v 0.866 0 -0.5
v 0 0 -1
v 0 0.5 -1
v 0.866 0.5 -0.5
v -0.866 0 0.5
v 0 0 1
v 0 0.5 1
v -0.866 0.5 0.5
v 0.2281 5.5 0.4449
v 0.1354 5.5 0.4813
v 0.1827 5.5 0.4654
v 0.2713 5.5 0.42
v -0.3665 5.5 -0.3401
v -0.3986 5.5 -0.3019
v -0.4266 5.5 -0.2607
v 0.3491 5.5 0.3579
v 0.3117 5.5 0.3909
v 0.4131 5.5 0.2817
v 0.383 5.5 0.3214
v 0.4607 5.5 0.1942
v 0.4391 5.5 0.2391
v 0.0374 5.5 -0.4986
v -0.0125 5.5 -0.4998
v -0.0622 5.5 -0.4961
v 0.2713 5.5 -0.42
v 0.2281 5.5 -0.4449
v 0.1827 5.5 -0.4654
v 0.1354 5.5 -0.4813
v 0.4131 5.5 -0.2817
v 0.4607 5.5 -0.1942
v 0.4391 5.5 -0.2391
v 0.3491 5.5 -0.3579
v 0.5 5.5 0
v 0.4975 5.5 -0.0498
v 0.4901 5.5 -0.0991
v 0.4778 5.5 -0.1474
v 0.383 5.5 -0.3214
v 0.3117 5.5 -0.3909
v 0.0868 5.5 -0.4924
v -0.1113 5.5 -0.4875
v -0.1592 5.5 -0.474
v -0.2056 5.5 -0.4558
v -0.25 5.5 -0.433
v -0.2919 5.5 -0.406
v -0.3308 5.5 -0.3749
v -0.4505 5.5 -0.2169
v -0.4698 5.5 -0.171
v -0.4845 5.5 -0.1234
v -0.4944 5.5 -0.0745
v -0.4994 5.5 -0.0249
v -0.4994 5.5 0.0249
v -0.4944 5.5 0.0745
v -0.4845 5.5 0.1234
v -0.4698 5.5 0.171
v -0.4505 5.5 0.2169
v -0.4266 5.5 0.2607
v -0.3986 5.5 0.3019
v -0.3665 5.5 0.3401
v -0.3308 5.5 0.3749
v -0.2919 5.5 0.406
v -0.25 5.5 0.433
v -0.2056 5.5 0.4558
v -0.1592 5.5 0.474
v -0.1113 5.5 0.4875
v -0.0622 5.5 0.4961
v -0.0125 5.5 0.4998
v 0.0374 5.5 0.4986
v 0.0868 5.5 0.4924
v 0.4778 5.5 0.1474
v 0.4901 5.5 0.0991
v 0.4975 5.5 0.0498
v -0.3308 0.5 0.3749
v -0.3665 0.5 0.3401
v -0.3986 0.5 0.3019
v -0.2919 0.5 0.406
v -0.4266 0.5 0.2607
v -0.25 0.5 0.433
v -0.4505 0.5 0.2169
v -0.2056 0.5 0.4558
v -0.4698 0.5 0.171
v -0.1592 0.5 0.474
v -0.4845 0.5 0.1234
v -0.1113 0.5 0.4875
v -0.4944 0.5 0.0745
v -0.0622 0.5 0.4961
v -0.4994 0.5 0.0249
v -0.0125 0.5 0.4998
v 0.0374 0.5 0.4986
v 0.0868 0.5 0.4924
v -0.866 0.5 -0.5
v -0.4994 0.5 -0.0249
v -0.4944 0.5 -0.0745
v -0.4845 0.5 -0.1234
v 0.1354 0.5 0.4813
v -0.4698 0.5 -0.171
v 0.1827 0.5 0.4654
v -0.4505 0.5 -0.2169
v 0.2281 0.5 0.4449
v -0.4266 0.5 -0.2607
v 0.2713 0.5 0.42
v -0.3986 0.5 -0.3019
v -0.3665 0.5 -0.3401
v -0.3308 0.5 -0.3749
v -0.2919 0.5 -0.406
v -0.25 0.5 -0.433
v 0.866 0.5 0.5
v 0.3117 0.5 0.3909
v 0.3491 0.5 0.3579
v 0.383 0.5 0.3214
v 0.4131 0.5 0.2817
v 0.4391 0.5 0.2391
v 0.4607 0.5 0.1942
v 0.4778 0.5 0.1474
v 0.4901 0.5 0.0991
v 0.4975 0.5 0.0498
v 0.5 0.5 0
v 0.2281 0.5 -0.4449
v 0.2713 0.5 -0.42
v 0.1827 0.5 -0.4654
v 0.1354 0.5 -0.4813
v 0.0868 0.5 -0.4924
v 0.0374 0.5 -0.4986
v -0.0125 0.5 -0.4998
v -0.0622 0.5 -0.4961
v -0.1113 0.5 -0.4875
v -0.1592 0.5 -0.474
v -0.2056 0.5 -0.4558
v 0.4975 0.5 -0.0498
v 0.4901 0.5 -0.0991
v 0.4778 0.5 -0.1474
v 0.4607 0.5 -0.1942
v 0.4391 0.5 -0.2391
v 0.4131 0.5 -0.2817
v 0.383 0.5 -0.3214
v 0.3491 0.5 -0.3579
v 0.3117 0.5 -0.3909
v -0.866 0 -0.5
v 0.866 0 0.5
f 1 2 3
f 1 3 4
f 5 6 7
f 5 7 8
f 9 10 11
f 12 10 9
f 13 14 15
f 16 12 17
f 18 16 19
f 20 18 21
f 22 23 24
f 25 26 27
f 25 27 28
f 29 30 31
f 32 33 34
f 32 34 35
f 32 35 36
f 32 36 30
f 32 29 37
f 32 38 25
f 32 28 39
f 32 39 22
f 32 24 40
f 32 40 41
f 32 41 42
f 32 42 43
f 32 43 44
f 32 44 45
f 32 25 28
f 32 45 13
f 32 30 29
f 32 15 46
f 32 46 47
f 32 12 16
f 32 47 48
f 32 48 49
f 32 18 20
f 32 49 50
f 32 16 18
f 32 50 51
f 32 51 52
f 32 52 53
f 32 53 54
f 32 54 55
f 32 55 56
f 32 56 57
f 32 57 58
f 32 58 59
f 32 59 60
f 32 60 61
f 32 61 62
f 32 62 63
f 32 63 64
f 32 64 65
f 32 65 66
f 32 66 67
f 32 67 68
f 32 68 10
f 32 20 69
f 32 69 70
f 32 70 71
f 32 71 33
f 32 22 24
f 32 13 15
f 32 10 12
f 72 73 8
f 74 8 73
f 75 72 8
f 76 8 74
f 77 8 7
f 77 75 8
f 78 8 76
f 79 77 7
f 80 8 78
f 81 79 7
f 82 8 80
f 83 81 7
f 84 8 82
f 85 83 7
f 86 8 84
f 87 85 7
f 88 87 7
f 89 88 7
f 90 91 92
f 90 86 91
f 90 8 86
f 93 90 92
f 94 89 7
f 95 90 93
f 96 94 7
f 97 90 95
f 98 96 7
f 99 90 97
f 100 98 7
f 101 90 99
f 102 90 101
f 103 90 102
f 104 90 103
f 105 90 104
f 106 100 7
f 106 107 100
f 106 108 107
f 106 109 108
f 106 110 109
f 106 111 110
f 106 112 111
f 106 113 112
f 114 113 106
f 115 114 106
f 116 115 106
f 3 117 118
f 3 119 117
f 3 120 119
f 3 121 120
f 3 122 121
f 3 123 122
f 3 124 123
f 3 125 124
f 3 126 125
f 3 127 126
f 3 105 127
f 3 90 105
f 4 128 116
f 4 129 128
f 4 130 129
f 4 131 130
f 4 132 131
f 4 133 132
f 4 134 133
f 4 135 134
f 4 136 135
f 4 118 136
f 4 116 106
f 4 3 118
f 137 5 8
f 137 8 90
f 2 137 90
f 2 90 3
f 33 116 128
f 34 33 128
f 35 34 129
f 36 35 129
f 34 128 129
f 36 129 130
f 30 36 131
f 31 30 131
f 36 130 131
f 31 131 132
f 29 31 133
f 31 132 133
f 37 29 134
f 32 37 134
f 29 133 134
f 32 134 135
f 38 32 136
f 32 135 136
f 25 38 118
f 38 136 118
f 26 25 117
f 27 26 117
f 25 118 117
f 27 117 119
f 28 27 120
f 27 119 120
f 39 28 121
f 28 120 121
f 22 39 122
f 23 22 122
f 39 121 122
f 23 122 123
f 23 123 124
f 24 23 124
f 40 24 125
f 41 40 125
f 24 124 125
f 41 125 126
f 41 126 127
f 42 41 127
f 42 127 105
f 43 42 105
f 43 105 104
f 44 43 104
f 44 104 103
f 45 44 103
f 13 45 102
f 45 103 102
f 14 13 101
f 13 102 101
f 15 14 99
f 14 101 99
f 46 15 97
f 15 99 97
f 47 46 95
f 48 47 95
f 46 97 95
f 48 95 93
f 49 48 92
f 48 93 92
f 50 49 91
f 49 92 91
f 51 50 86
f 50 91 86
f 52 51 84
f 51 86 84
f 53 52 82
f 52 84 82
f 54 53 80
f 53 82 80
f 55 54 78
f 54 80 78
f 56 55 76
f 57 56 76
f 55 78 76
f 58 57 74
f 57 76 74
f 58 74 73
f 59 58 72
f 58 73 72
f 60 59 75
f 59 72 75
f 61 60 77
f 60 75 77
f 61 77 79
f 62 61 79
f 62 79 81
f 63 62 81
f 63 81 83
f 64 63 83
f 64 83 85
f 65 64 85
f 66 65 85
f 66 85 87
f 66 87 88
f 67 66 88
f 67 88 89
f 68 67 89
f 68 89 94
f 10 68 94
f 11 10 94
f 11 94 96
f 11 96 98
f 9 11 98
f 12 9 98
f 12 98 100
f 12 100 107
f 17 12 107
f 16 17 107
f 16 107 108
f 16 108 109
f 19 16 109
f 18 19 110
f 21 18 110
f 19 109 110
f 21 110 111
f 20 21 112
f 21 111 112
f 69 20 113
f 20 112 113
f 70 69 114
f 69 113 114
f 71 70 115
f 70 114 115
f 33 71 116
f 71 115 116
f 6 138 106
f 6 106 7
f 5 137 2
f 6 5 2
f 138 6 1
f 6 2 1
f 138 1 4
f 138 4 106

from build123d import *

# Parameters (mm, degrees)
SKETCH1_R           = 1
BOSS_EXTRUDE1_DEPTH = 0.5
SKETCH2_R           = 0.5
BOSS_EXTRUDE2_DEPTH = 5
SKETCH3_OUTSIDE_W   = 5.236
SKETCH3_OUTSIDE_H   = 5.236
CUT_EXTRUDE2_DEPTH  = 10


with BuildPart() as part:
    # Sketch1 → Boss-Extrude1 (new body)
    with BuildSketch(Plane(origin=(0, 0, 0), x_dir=(1, 0, 0), z_dir=(0, 1, 0))):
        Circle(SKETCH1_R)
    extrude(amount=BOSS_EXTRUDE1_DEPTH)

    # Sketch2 → Boss-Extrude2 (add)
    with BuildSketch(Plane(origin=(0, 0.5, 0), x_dir=(1, 0, 0), z_dir=(0, 1, 0))):
        Circle(SKETCH2_R)
    extrude(amount=BOSS_EXTRUDE2_DEPTH)

    # Sketch3 outside → Cut-Extrude2 (cut)
    with BuildSketch(Plane(origin=(0, 0, 0), x_dir=(-1, 0, 0), z_dir=(0, -1, 0))):
        Rectangle(SKETCH3_OUTSIDE_W, SKETCH3_OUTSIDE_H)
        Polygon((0.866025404, 0.5), (0, 1), (-0.866025404, 0.5), (-0.866025404, -0.5), (0, -1), (0.866025404, -0.5), align=None, mode=Mode.SUBTRACT)
    extrude(amount=-CUT_EXTRUDE2_DEPTH, mode=Mode.SUBTRACT)


solid = part.part
